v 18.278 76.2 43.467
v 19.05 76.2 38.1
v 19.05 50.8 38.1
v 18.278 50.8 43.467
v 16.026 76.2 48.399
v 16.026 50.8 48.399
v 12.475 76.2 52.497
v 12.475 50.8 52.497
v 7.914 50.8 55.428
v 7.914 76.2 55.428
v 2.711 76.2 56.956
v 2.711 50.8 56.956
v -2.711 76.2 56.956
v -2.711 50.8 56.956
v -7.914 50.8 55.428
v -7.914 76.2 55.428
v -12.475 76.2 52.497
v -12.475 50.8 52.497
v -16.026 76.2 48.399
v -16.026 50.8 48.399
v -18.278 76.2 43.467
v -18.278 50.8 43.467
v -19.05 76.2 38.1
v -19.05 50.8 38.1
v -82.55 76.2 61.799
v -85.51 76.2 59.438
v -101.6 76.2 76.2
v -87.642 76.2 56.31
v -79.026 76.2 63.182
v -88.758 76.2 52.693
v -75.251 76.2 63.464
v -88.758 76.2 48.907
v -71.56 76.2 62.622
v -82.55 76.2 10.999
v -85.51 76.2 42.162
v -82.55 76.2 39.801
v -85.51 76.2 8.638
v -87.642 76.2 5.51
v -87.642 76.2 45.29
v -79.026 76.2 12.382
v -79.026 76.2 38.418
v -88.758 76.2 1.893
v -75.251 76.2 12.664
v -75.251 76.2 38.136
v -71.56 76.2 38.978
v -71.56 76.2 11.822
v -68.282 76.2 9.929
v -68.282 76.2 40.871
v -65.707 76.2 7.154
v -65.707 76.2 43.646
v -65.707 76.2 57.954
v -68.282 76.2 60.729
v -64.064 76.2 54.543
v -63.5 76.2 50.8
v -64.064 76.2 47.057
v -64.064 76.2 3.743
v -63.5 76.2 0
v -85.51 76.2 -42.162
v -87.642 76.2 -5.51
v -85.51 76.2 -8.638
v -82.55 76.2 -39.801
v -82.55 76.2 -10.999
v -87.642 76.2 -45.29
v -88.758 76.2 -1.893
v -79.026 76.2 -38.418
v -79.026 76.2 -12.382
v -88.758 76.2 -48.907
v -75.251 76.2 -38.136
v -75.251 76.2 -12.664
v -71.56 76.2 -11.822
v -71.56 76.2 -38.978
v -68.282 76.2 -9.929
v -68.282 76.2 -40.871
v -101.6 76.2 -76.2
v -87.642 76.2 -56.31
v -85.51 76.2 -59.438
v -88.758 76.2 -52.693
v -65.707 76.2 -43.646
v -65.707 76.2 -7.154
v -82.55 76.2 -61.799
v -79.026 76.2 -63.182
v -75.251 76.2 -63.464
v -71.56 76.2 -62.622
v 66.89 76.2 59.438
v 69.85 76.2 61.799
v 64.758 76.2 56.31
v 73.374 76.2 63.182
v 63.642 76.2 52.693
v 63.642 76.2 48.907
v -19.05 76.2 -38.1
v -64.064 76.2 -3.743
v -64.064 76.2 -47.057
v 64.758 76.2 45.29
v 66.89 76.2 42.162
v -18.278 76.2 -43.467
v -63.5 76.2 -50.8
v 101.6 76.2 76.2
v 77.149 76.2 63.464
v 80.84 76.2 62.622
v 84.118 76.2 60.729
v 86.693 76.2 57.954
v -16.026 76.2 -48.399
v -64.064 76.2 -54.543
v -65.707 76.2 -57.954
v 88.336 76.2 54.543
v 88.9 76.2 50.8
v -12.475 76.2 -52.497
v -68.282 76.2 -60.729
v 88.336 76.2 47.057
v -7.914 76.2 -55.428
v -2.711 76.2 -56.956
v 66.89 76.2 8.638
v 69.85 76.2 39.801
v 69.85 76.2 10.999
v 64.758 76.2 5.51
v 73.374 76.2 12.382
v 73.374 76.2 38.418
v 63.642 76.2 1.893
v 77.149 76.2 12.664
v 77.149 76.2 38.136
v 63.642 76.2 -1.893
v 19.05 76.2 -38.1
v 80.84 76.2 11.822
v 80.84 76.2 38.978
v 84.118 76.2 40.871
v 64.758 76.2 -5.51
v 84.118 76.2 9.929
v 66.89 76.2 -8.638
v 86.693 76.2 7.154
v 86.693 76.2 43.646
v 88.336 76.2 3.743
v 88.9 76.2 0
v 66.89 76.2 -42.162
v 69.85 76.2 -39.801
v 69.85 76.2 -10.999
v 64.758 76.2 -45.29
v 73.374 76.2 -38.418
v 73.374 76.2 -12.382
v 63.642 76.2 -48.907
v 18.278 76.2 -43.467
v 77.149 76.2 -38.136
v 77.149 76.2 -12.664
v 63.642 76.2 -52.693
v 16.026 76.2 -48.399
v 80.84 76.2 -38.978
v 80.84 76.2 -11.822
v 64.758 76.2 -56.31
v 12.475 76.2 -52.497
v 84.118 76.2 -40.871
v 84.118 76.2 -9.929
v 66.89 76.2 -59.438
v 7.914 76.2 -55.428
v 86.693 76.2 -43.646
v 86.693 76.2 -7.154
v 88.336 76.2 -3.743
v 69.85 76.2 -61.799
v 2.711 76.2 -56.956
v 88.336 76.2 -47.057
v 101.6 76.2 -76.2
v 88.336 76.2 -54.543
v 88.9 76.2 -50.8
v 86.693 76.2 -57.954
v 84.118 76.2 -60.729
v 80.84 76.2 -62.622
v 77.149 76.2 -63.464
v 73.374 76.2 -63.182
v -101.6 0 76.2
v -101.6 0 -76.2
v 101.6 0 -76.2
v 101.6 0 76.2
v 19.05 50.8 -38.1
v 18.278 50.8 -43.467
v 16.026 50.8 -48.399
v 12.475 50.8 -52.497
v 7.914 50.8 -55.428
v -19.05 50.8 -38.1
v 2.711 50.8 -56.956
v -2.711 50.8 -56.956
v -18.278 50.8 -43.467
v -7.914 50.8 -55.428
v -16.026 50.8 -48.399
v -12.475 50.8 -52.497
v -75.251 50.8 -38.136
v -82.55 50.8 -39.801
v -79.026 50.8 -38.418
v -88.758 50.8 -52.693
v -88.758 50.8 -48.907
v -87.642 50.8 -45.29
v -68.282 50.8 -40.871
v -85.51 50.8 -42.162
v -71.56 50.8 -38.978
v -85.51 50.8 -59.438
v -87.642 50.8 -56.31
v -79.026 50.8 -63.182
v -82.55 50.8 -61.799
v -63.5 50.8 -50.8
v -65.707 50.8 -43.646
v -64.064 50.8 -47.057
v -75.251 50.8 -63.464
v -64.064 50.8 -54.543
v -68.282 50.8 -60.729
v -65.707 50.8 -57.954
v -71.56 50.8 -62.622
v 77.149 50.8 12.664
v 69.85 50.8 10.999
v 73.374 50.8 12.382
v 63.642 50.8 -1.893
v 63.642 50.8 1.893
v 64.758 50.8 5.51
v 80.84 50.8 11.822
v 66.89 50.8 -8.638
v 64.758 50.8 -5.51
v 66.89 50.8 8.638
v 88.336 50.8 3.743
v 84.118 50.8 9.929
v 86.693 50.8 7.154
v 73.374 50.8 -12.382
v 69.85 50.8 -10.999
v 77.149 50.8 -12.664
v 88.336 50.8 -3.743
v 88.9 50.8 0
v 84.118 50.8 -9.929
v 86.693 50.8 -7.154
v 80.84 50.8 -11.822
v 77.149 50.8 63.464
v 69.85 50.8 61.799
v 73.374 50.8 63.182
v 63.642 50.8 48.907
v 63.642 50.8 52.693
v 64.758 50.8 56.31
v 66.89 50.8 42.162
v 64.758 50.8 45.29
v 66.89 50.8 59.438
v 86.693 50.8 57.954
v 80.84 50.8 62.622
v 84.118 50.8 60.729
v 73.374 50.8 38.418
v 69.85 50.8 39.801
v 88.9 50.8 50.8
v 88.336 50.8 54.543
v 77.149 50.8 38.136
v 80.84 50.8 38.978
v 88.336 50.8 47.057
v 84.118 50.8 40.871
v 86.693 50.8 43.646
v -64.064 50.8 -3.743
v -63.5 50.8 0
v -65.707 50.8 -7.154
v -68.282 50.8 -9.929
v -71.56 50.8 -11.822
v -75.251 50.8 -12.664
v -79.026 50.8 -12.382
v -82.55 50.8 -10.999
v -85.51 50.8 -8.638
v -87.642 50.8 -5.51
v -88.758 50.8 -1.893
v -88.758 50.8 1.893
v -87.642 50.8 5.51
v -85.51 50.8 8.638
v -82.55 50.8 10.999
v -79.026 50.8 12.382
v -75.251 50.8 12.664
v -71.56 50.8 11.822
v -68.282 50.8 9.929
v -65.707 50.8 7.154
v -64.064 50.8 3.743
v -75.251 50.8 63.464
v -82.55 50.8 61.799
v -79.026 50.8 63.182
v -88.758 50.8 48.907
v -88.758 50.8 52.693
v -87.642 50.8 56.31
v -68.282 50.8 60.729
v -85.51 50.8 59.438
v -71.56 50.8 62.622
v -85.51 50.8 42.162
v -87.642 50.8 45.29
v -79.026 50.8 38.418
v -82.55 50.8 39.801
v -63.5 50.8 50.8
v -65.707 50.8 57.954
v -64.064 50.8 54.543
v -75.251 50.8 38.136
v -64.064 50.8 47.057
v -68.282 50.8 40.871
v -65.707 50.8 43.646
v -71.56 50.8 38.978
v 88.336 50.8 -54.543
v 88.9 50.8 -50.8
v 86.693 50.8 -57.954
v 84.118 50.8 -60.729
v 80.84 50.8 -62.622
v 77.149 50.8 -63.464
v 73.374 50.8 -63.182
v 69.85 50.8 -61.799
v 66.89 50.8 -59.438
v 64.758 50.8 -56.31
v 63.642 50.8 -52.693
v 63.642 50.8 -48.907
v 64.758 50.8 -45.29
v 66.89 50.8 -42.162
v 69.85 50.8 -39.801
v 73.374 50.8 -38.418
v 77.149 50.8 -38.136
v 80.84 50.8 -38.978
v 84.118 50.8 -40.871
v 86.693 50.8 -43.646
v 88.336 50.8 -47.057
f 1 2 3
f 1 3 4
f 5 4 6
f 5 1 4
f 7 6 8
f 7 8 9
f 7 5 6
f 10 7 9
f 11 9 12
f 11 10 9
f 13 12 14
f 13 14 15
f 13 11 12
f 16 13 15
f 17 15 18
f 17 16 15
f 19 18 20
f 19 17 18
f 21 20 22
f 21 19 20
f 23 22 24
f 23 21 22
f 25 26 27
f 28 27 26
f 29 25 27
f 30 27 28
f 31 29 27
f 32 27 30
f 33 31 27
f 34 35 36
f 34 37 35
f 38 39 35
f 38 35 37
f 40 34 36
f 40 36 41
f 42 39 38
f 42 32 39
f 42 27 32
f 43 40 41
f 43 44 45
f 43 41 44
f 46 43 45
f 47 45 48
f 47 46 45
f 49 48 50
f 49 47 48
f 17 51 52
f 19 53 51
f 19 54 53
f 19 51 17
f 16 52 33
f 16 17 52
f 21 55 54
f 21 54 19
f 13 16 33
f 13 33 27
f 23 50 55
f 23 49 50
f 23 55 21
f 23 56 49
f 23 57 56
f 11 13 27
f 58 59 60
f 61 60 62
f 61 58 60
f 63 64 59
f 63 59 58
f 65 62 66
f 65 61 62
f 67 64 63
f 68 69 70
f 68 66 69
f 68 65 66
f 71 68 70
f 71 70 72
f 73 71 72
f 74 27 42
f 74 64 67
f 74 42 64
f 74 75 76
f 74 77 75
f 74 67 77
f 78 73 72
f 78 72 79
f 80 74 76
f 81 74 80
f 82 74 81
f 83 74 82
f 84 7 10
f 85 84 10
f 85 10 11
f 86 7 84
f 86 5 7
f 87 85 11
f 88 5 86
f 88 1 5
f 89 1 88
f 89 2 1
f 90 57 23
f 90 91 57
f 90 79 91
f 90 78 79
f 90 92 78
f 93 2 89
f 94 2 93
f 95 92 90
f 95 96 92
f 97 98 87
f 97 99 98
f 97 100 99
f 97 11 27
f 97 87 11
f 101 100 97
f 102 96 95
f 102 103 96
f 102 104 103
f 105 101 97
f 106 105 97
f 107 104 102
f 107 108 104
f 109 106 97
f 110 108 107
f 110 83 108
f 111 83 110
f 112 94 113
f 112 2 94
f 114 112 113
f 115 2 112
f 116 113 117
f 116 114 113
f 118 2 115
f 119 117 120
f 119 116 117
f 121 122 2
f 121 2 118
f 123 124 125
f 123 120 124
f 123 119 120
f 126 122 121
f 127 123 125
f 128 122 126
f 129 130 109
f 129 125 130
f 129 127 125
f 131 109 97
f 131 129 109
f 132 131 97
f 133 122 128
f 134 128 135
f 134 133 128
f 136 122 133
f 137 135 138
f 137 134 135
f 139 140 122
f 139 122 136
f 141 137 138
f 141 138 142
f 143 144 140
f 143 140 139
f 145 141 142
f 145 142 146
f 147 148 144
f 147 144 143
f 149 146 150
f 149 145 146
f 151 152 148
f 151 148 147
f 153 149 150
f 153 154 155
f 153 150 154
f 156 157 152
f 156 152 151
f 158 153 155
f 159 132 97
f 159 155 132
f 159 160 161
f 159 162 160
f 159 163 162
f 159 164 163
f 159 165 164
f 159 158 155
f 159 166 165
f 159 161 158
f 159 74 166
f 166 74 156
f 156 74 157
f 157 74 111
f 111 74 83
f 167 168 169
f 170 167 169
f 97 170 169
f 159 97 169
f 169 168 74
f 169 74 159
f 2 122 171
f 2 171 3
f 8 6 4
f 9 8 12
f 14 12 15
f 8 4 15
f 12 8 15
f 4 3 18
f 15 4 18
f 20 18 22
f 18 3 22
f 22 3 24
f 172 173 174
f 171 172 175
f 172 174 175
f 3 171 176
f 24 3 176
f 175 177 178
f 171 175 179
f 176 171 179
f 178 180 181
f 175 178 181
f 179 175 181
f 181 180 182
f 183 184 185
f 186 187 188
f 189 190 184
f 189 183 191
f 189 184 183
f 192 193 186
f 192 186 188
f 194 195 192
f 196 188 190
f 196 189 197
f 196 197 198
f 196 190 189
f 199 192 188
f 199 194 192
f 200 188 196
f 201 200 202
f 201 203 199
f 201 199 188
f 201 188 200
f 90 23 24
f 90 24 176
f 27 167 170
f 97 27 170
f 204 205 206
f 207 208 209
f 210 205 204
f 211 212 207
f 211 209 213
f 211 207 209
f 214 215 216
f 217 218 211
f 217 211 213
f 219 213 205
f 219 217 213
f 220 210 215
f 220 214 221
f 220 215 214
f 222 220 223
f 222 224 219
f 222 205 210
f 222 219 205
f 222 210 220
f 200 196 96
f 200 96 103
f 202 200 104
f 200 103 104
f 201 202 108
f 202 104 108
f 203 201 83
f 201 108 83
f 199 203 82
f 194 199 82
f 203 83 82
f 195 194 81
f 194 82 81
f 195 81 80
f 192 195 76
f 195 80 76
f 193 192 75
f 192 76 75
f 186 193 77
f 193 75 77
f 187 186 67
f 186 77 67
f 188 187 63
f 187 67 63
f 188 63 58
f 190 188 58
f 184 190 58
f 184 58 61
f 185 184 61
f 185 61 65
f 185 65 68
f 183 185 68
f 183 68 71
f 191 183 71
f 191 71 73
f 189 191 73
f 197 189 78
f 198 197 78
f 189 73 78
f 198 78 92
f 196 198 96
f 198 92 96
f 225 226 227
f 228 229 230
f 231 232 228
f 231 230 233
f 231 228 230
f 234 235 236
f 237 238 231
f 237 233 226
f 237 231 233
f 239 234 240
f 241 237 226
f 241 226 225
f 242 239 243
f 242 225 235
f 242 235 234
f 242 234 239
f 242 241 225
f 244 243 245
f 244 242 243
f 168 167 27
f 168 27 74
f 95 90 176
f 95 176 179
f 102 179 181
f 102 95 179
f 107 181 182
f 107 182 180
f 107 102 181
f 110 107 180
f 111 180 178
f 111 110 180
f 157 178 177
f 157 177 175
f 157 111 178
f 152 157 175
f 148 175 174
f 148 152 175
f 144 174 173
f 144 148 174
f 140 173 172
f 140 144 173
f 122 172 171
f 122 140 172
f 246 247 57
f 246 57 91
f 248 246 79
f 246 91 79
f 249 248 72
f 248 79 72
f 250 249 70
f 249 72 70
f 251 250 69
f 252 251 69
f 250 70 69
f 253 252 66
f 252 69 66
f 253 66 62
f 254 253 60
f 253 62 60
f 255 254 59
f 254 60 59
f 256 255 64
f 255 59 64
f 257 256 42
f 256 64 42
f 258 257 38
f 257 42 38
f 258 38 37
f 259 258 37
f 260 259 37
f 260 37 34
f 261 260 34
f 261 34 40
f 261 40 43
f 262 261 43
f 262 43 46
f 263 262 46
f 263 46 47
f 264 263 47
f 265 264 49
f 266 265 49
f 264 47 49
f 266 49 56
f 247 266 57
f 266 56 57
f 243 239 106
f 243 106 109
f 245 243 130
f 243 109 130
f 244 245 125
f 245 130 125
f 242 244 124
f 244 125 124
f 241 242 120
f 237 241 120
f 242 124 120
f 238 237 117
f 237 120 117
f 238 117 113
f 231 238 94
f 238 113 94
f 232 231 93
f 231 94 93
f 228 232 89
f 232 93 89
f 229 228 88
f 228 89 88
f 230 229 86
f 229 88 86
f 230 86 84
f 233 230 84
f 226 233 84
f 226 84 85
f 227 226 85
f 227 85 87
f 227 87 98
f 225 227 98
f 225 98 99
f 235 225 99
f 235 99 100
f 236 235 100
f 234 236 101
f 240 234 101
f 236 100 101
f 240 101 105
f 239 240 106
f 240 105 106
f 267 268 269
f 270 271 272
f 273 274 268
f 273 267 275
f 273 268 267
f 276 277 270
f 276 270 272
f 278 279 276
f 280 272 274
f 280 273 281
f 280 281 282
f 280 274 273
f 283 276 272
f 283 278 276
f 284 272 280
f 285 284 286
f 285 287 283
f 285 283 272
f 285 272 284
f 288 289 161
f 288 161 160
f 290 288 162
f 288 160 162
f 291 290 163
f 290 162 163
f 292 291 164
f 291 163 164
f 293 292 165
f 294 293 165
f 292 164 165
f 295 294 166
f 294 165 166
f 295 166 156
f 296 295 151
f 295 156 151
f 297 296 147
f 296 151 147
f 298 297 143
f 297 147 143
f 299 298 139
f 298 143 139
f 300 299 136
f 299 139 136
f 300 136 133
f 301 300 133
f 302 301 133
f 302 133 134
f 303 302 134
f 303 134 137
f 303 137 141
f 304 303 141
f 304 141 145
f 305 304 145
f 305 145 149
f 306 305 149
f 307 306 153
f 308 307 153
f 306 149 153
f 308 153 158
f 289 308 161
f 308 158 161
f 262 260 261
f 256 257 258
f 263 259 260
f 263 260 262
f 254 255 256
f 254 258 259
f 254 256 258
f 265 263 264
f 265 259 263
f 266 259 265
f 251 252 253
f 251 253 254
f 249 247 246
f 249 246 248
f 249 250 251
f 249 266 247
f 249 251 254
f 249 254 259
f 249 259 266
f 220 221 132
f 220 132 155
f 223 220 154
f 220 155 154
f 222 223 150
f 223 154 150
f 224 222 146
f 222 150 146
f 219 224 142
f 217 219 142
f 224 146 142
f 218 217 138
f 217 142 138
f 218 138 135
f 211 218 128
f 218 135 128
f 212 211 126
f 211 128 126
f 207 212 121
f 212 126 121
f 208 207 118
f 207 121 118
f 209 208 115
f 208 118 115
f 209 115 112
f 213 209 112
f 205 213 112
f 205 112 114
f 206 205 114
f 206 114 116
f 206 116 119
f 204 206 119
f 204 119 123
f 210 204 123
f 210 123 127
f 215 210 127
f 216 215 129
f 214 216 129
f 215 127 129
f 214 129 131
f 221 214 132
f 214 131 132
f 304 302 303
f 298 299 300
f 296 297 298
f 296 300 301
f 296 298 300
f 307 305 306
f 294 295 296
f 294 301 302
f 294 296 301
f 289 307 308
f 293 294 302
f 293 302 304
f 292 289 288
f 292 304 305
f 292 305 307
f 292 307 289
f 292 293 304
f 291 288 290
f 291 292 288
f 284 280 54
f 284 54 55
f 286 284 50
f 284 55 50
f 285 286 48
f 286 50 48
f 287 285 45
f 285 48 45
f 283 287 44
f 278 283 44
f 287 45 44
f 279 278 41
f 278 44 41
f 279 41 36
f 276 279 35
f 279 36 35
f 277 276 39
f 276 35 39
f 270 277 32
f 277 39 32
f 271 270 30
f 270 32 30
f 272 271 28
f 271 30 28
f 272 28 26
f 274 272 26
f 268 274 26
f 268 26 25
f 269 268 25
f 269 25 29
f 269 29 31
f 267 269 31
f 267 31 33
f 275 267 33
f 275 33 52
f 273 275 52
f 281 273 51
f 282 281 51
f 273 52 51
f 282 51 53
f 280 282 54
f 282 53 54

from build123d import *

# Parameters (mm, degrees)
SKETCH1_W           = 203.2
SKETCH1_H           = 152.4
BOSS_EXTRUDE1_DEPTH = 76.2
SKETCH2_R           = 12.7
CUT_EXTRUDE1_DEPTH  = 25.4


with BuildPart() as part:
    # Sketch1 → Boss-Extrude1 (new body)
    with BuildSketch(Plane(origin=(0, 0, 0), x_dir=(1, 0, 0), z_dir=(0, 1, 0))):
        Rectangle(SKETCH1_W, SKETCH1_H)
    extrude(amount=BOSS_EXTRUDE1_DEPTH)

    # Sketch2 → Cut-Extrude1 (cut)
    with BuildSketch(Plane(origin=(0, 76.2, 0), x_dir=(1, 0, 0), z_dir=(0, 1, 0))):
        with Locations((-76.2, -50.8)):
            Circle(SKETCH2_R)
        with Locations((-76.2, 0)):
            Circle(SKETCH2_R)
        with Locations((-76.2, 50.8)):
            Circle(SKETCH2_R)
        with Locations((76.2, 50.8)):
            Circle(SKETCH2_R)
        with Locations((76.2, -50.8)):
            Circle(SKETCH2_R)
        with Locations((76.2, 0)):
            Circle(SKETCH2_R)
        with BuildLine():
            Line((-19.05, -38.1), (-19.05, 38.1))
            ThreePointArc((-19.05, 38.1), (0, 57.15), (19.05, 38.1))
            Line((19.05, 38.1), (19.05, -38.1))
            ThreePointArc((19.05, -38.1), (0, -57.15), (-19.05, -38.1))
        make_face()
    extrude(amount=-CUT_EXTRUDE1_DEPTH, mode=Mode.SUBTRACT)


solid = part.part
